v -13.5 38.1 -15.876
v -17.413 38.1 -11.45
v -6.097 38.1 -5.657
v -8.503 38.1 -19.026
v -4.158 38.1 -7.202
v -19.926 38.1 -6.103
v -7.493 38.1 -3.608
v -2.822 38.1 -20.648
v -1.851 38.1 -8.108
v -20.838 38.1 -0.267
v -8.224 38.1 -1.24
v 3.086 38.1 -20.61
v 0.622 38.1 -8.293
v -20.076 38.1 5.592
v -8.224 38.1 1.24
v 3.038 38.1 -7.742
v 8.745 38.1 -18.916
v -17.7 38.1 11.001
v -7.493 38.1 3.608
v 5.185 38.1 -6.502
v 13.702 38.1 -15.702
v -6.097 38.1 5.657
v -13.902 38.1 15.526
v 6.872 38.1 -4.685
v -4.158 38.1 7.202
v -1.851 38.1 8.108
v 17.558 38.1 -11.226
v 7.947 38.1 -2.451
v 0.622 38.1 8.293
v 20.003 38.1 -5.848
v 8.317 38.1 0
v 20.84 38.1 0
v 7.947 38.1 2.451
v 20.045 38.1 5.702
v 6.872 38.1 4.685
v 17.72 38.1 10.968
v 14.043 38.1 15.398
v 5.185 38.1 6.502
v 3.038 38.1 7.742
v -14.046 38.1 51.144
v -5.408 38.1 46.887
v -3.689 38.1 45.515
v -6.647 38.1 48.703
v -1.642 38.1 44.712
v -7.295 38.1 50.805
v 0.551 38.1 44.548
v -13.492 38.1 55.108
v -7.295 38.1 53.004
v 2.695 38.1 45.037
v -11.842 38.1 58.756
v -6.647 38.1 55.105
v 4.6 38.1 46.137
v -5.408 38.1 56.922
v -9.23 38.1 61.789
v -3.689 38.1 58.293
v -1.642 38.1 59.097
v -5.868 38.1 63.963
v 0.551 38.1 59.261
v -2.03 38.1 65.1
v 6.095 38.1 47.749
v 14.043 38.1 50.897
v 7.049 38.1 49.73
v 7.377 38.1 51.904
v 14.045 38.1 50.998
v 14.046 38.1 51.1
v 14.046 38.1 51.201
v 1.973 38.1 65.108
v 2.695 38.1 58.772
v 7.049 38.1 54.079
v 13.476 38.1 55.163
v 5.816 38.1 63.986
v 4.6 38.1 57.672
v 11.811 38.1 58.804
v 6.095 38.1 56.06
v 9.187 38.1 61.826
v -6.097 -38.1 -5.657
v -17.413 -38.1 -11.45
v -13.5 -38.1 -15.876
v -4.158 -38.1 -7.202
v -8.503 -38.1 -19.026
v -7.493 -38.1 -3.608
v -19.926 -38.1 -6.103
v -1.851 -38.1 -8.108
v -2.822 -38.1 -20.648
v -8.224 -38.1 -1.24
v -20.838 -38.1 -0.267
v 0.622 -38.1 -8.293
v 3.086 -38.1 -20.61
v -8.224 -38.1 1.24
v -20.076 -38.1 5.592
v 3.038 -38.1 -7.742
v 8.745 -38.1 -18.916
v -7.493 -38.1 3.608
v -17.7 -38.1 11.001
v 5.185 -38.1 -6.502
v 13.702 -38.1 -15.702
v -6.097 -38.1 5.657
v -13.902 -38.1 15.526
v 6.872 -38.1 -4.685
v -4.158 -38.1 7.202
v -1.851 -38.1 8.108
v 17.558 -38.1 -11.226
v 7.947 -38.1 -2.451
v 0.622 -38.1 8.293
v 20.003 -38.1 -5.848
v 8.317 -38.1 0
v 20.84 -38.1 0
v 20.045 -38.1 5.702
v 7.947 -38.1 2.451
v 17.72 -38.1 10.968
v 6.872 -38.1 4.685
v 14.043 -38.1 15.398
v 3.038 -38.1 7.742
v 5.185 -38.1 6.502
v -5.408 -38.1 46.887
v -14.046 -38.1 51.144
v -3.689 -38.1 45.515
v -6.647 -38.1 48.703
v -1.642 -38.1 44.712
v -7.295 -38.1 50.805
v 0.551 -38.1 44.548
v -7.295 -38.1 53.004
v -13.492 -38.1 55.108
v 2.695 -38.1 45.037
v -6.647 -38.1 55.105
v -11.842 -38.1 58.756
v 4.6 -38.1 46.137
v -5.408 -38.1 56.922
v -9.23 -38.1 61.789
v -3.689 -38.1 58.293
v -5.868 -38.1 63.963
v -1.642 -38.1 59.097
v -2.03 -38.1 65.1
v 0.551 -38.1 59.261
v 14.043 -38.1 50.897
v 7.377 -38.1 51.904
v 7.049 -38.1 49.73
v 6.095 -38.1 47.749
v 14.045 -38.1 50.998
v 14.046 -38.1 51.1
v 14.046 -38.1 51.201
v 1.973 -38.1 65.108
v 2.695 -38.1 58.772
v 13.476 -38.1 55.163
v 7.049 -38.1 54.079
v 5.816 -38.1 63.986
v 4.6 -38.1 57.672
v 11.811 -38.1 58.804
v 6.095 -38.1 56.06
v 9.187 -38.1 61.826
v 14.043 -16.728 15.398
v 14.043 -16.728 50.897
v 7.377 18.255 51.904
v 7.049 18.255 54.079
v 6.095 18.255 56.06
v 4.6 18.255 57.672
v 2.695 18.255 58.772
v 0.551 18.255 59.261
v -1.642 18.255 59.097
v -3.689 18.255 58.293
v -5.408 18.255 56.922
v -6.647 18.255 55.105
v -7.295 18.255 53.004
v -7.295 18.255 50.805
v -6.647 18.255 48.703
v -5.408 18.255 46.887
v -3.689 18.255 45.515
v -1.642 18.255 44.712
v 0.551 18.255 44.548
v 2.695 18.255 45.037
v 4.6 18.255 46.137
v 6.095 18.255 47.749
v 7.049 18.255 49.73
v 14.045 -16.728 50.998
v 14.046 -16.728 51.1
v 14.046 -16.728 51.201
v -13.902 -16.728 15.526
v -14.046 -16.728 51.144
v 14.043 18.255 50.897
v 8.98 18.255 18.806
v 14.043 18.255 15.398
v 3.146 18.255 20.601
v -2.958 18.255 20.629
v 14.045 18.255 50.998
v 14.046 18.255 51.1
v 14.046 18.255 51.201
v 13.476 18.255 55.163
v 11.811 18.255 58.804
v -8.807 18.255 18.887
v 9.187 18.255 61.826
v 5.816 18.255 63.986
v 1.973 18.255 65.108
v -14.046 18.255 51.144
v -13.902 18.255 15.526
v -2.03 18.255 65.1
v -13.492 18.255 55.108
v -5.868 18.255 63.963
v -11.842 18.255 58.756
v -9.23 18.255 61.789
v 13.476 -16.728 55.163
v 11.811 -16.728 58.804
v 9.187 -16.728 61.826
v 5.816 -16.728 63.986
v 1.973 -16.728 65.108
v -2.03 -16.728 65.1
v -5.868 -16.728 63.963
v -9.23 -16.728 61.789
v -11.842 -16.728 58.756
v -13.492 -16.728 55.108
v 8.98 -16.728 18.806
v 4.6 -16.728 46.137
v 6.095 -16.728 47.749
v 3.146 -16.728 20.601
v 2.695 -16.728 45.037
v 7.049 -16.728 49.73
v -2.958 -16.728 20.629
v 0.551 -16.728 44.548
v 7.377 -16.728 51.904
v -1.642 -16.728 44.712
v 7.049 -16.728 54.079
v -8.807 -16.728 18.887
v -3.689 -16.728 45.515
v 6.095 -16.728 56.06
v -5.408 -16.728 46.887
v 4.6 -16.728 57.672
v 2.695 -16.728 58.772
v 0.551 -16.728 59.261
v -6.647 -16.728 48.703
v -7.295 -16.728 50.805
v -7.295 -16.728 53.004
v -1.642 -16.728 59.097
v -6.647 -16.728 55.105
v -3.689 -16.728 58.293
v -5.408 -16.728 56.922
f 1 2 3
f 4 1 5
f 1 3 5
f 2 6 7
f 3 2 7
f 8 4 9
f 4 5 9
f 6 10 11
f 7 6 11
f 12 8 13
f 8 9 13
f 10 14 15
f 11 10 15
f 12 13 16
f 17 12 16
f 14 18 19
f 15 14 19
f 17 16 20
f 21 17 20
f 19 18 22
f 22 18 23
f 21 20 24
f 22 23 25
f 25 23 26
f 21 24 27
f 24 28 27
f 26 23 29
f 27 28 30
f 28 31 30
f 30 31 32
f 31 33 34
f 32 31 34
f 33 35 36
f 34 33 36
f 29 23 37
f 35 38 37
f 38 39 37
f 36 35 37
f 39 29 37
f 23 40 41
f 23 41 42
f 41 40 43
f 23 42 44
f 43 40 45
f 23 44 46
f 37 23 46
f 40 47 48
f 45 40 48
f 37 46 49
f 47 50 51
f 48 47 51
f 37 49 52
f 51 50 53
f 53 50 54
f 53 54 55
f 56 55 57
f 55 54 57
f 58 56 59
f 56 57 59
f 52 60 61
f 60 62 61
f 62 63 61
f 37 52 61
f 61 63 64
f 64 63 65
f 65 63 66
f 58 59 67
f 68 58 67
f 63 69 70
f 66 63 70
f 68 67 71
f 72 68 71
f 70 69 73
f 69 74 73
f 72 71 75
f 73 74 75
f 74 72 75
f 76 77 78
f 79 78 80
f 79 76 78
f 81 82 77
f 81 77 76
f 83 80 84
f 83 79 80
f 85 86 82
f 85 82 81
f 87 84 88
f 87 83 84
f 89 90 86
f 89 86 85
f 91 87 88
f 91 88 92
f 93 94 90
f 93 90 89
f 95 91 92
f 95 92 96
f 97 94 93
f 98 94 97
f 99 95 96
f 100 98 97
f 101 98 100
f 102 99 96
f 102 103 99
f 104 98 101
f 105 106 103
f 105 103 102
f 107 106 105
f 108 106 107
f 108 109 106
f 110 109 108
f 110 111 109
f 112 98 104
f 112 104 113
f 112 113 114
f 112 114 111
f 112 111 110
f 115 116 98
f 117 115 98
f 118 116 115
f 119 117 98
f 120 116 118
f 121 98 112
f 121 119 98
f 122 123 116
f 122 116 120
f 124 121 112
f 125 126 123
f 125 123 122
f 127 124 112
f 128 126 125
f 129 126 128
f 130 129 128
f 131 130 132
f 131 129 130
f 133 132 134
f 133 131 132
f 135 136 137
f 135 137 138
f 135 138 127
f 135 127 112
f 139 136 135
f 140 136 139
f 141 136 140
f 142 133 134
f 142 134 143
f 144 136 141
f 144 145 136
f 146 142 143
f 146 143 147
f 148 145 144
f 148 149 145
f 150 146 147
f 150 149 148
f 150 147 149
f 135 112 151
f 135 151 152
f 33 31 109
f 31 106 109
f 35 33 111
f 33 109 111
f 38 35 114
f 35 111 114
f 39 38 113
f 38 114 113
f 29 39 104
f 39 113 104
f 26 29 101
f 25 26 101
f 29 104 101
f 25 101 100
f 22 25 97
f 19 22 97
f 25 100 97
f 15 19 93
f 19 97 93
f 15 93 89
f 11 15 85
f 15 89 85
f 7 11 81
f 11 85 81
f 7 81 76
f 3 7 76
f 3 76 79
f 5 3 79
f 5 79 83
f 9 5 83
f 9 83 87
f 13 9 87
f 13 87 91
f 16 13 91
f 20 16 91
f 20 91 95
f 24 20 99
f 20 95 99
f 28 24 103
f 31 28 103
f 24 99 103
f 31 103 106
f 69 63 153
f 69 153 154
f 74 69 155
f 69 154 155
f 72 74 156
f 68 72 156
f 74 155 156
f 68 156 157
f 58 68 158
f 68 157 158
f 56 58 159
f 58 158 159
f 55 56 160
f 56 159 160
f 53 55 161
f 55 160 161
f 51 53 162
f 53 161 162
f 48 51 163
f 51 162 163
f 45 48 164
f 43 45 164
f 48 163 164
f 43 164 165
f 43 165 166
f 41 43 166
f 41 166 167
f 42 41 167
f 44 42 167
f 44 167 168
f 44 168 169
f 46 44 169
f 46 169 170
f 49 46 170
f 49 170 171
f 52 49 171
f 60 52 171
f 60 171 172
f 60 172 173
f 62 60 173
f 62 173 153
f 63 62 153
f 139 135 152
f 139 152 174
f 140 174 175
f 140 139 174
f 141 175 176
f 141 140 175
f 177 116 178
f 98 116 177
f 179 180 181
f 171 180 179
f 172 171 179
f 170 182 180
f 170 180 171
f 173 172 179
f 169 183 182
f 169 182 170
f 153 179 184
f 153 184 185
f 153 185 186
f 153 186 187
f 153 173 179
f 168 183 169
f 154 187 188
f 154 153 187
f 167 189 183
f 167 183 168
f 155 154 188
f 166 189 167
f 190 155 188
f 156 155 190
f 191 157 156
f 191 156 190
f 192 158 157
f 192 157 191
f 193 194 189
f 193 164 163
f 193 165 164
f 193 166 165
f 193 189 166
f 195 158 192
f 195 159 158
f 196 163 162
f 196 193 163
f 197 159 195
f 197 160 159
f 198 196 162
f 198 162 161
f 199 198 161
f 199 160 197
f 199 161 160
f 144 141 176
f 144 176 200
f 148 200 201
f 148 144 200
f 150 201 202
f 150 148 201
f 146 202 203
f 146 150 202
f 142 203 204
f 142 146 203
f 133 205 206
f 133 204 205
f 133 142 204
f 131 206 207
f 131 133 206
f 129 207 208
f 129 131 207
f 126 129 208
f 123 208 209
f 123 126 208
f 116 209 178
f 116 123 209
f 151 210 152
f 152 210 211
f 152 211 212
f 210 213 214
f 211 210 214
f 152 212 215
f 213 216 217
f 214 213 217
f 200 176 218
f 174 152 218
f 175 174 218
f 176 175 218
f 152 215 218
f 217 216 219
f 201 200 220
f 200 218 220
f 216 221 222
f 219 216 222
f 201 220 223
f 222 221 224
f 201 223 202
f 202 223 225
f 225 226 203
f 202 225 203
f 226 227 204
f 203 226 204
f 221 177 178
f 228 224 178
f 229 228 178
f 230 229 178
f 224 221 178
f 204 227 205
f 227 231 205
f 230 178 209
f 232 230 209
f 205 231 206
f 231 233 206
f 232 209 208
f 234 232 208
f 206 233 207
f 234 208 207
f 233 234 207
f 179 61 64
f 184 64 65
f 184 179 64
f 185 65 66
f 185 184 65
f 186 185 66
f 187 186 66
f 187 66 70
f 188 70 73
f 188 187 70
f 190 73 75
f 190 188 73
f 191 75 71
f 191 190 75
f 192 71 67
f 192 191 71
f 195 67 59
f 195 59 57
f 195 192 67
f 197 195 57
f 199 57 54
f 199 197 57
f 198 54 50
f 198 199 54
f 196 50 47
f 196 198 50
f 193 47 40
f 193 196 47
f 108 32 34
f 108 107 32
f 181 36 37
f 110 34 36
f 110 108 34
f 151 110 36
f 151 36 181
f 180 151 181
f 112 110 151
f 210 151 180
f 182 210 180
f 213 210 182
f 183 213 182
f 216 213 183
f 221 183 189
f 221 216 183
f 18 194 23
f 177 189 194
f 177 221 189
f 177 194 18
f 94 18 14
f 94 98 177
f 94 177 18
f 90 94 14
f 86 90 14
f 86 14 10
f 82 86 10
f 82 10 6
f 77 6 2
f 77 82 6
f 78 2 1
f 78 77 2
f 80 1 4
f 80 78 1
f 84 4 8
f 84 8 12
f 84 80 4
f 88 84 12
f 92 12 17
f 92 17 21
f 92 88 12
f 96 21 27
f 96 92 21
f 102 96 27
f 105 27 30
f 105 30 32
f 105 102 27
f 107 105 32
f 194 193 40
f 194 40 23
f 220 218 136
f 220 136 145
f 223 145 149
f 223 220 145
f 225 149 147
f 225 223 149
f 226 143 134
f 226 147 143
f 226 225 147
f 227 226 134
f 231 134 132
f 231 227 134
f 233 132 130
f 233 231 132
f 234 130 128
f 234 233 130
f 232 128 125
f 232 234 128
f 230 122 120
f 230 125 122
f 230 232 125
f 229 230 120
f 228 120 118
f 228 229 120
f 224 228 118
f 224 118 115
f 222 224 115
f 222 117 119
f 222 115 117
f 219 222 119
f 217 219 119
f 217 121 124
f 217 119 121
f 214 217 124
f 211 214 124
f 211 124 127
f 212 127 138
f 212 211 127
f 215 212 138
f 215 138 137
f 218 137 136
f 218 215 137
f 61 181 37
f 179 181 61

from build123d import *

# Parameters (mm, degrees)
F1_DEPTH      = 38.1
F1_DEPTH_BACK = 38.1
F2_W          = 34.983035177
F2_H          = 57.6349133626
F3_DEPTH      = 14.047474361
F3_DEPTH_BACK = 25.4
F4_R          = 20.8399152663
F5_DEPTH      = 25.4
F6_DEPTH      = 38.1
F6_DEPTH_BACK = 38.1
F7_R          = 8.3166578591
F7_R_2        = 7.3771783421
F8_DEPTH      = 38.101
F8_DEPTH_BACK = 38.101


with BuildPart() as f1:
    # F0 (on Front) → F1 (new body, two sides)
    with BuildSketch(Plane.XZ) as f1_sk:
        with BuildLine():
            ThreePointArc((14.0431994365, 50.8973942286), (14.045655606, 51.0490359422), (14.046474361, 51.2006953359))
            ThreePointArc((14.046474361, 51.2006953359), (-0.0285058427, 65.247140772), (-14.0463586618, 51.1436837678))
            Line((-14.0463586618, 51.1436837678), (14.0431994365, 50.8973942286))
        make_face()
        with BuildLine():
            Line((14.0431994365, 50.8973942286), (-14.0463586618, 51.1436837678))
            ThreePointArc((-14.0463586618, 51.1436837678), (-0.1231549002, 37.1547608762), (14.0431994365, 50.8973942286))
        make_face()
        with BuildLine():
            ThreePointArc((14.0431994365, 50.8973942286), (-0.1231549002, 37.1547608762), (-14.0463586618, 51.1436837678))
            Line((-14.0463586618, 51.1436837678), (-13.7860988001, -12.9784494638))
            Line((-13.7860988001, -12.9784494638), (14.0431994365, -12.9784494638))
            Line((14.0431994365, -12.9784494638), (14.0431994365, 50.8973942286))
        make_face()
    extrude(amount=F1_DEPTH)
    extrude(f1_sk.sketch, amount=-F1_DEPTH_BACK)

    # F2 (on Right) → F3 (cut, two sides)
    with BuildSketch(Plane.YZ) as f3_sk:
        with Locations((0.7638838142, 41.7796033435)):
            Rectangle(F2_W, F2_H)
    extrude(amount=-F3_DEPTH, mode=Mode.SUBTRACT)
    extrude(f3_sk.sketch, amount=F3_DEPTH_BACK, mode=Mode.SUBTRACT)

    # F4 (on Front) → F5 (join)
    with BuildSketch(Plane.XZ):
        Circle(F4_R)
    extrude(amount=F5_DEPTH)

    # F4 (on Front) → F6 (join, two sides)
    with BuildSketch(Plane.XZ) as f6_sk:
        Circle(F4_R)
    extrude(amount=F6_DEPTH)
    extrude(f6_sk.sketch, amount=-F6_DEPTH_BACK)

    # F7 (on Front) → F8 (cut, two sides)
    with BuildSketch(Plane.XZ) as f8_sk:
        Circle(F7_R)
        with Locations((0, 51.9042946398)):
            Circle(F7_R_2)
    extrude(amount=-F8_DEPTH, mode=Mode.SUBTRACT)
    extrude(f8_sk.sketch, amount=F8_DEPTH_BACK, mode=Mode.SUBTRACT)


solid = f1.part
